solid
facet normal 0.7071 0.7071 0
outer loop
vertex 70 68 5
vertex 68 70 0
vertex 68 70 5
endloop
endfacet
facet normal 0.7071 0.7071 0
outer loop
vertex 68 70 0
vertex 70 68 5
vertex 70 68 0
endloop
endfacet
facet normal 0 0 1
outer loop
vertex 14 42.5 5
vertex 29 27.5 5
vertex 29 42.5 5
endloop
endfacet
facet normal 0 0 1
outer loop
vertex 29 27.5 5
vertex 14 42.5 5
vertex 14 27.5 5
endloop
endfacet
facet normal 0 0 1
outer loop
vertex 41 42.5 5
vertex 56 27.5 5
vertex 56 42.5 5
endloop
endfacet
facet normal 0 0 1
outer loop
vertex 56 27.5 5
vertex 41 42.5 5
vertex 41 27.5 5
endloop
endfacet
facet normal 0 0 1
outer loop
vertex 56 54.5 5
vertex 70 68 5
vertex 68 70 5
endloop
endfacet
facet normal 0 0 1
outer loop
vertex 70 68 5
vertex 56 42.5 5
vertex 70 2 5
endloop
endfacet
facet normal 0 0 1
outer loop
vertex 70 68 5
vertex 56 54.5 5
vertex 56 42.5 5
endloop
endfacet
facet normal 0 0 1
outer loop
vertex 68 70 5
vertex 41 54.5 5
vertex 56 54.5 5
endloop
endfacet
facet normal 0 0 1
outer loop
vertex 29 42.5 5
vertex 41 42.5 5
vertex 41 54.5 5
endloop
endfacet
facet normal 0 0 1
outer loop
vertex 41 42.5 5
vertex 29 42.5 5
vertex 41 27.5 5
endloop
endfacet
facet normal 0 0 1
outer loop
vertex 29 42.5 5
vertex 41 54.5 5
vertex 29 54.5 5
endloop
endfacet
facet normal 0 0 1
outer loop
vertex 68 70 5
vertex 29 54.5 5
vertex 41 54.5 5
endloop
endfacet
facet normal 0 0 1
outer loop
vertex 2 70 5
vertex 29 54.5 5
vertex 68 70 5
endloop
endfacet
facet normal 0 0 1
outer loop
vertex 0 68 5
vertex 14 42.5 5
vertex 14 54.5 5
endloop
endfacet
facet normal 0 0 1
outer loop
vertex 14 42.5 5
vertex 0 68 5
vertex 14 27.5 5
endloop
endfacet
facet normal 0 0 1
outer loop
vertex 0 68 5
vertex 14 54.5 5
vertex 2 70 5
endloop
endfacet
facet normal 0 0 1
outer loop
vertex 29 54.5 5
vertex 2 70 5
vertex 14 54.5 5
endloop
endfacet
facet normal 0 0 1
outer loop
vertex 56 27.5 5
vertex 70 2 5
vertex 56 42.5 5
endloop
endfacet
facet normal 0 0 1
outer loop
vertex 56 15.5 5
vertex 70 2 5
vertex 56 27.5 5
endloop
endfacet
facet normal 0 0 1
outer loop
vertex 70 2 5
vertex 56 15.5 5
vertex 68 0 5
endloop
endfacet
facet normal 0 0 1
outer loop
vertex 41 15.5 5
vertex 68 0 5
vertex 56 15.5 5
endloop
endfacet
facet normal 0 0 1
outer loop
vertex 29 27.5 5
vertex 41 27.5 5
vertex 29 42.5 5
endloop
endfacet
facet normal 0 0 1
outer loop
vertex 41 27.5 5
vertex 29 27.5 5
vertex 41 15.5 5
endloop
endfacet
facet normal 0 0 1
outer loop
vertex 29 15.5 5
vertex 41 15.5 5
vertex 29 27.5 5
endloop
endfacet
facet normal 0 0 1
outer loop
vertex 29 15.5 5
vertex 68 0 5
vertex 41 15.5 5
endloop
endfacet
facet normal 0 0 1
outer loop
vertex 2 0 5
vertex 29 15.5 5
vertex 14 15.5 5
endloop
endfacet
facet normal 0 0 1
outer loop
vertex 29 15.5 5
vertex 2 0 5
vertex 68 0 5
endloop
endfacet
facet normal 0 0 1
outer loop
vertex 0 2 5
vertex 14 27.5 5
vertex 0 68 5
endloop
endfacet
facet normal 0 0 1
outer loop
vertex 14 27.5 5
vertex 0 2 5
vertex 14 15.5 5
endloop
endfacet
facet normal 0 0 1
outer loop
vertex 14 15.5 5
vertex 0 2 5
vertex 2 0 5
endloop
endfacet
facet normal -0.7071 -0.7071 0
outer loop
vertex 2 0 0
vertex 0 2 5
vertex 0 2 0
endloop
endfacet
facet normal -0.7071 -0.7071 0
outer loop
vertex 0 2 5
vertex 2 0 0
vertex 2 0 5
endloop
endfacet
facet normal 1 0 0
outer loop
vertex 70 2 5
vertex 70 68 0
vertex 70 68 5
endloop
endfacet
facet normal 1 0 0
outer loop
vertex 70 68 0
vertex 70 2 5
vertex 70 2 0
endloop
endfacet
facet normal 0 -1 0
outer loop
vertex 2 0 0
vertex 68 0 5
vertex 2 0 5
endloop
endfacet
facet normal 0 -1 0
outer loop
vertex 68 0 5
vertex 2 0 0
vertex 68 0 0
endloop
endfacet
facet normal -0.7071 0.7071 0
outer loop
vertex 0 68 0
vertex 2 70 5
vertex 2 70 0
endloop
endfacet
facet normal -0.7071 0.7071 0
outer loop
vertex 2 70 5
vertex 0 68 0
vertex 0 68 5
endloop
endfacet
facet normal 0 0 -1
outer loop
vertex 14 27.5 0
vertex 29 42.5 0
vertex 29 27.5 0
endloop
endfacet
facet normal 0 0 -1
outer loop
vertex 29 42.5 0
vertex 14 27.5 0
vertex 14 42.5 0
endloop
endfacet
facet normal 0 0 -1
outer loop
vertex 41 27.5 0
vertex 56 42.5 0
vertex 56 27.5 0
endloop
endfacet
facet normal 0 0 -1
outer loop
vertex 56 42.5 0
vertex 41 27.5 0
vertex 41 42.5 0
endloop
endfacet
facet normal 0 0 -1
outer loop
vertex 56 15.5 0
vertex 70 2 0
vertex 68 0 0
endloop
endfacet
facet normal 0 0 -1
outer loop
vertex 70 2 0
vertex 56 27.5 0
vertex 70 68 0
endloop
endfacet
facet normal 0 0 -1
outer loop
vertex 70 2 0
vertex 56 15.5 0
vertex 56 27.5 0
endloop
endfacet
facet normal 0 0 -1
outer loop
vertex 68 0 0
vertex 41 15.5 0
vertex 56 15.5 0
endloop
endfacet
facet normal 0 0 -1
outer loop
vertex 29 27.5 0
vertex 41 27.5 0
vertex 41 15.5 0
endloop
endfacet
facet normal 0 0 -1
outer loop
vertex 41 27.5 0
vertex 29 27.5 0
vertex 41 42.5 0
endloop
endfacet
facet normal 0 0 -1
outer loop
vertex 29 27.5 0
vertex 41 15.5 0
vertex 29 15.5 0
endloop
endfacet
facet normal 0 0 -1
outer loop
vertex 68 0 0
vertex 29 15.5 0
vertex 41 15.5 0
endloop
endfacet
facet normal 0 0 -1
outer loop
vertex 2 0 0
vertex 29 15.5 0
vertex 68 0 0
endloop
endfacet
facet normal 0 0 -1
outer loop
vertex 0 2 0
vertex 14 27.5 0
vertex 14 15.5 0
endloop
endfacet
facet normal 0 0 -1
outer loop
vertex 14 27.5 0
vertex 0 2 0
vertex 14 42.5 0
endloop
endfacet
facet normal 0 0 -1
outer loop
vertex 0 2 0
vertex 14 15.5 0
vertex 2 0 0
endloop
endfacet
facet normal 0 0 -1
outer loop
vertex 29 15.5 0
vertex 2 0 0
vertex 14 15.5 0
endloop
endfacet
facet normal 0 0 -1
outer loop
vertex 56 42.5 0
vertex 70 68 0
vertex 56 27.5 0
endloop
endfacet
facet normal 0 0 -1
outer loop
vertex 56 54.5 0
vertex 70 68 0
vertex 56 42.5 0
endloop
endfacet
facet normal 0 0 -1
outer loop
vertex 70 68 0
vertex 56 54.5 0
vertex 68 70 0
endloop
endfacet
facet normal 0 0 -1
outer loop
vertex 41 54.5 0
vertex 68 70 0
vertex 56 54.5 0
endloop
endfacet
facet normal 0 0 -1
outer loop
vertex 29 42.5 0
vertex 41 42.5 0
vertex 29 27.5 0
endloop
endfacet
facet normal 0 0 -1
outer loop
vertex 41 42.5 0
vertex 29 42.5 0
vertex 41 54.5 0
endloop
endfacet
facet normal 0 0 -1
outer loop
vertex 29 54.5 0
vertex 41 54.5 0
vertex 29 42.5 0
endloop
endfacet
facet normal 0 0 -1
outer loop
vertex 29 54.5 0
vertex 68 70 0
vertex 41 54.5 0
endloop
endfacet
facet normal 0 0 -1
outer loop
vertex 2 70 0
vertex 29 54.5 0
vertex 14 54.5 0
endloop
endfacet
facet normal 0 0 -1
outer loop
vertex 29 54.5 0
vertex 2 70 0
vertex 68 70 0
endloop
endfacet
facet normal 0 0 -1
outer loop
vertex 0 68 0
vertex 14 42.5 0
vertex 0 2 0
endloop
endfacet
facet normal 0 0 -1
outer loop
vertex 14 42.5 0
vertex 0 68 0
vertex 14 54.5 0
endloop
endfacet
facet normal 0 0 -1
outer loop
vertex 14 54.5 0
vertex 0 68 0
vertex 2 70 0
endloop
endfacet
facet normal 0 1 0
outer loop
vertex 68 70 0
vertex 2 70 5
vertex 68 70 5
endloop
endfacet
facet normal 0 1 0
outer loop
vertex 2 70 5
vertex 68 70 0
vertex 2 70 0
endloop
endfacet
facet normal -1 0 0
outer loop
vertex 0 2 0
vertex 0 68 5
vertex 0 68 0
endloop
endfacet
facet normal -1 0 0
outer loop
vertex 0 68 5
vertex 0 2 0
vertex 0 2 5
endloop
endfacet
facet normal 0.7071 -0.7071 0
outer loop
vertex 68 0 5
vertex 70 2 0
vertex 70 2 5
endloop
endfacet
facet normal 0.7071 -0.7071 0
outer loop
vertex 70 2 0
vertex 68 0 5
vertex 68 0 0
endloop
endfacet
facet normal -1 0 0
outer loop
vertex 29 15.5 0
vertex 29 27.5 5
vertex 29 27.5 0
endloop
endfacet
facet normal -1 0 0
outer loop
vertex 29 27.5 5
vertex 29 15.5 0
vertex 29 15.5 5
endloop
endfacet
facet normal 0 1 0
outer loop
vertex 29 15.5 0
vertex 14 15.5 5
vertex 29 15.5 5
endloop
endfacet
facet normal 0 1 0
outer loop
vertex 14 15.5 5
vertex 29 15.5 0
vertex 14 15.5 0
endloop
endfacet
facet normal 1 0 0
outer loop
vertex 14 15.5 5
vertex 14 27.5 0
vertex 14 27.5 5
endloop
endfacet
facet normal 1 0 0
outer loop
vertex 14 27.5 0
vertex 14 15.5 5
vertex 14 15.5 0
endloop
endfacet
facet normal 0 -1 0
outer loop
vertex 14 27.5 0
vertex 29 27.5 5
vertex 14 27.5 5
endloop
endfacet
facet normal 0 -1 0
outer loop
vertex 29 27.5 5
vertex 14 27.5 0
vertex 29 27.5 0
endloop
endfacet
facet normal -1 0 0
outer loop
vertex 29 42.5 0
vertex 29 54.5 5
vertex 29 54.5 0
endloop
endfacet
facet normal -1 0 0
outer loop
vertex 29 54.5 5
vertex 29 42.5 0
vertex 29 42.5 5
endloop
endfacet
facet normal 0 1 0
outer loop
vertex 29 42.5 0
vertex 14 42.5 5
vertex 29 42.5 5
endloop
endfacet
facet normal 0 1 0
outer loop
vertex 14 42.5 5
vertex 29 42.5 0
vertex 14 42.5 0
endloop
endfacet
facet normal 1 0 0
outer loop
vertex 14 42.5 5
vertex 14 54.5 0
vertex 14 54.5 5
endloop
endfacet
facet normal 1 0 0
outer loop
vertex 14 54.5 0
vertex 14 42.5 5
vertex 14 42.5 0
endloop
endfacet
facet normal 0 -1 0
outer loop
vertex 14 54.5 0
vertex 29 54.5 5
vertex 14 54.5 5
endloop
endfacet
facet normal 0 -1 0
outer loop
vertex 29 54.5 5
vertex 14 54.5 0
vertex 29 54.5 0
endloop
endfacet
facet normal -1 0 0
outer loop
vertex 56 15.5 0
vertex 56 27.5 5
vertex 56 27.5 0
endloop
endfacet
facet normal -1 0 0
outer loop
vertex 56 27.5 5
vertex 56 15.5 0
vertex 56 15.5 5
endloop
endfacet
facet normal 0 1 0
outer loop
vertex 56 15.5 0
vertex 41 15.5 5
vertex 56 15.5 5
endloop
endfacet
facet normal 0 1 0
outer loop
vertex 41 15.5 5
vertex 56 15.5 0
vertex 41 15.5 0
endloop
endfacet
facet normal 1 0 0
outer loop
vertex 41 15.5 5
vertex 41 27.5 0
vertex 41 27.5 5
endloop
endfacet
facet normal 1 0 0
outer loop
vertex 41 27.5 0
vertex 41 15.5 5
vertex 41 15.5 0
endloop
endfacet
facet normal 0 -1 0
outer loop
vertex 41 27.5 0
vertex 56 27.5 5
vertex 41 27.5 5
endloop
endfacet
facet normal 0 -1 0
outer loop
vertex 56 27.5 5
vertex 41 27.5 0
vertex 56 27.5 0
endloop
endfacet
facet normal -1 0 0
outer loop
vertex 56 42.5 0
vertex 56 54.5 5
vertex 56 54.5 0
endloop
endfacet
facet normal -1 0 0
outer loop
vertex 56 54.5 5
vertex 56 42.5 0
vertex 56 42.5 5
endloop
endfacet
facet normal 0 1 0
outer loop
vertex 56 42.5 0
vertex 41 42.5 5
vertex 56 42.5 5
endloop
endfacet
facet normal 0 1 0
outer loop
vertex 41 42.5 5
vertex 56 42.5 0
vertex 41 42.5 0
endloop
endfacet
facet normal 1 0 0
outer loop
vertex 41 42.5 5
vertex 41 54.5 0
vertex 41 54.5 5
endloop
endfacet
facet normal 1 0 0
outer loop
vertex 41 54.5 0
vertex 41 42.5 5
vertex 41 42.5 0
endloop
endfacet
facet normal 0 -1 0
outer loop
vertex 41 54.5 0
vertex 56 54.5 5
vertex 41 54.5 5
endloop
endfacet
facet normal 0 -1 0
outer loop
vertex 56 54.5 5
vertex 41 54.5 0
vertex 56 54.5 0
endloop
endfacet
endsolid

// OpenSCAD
$fn = 32;

// ----------------------------------------------------------------------
// Windowed plate: 4 voids, 70 x 70 x 5 mm
// ----------------------------------------------------------------------

// --- parameters (mm) ---
plate_l = 70;             // plate length, X
plate_w = 70;             // plate width, Y
plate_t = 5;              // plate thickness, Z
edge_margin = 8;          // wall from the plate edge to any window
win_l = 15;               // pocket length
win_w = 12;               // pocket width
pitch_x = 27;             // grid pitch along X
pitch_y = 27;             // grid pitch along Y
depth_1 = 5;              // depth of void 1 (full thickness = through)
depth_2 = 5;              // depth of void 2 (full thickness = through)
depth_3 = 5;              // depth of void 3 (full thickness = through)
depth_4 = 5;              // depth of void 4 (full thickness = through)
corner_c = 2;             // corner chamfer of the plate
fit_tol = 0.02;           // declared fit tolerance (prompt contract)
free_tol = 0.2;           // declared free tolerance (prompt contract)

profile = [[2, 0], [68, 0], [70, 2], [70, 68], [68, 70], [2, 70], [0, 68], [0, 2]];  // primary outline, 8 points, counter clockwise
void_1 = [[14, 15.5], [29, 15.5], [29, 27.5], [14, 27.5]];  // pocket at grid node 0,0, 4 points
void_2 = [[14, 42.5], [29, 42.5], [29, 54.5], [14, 54.5]];  // pocket at grid node 0,1, 4 points
void_3 = [[41, 15.5], [56, 15.5], [56, 27.5], [41, 27.5]];  // pocket at grid node 1,0, 4 points
void_4 = [[41, 42.5], [56, 42.5], [56, 54.5], [41, 54.5]];  // pocket at grid node 1,1, 4 points

// --- the one profile operation ---
difference() {
  linear_extrude(height = plate_t) polygon(points = profile);
  translate([0, 0, -1])
    linear_extrude(height = plate_t + 2) polygon(points = void_1);
  translate([0, 0, -1])
    linear_extrude(height = plate_t + 2) polygon(points = void_2);
  translate([0, 0, -1])
    linear_extrude(height = plate_t + 2) polygon(points = void_3);
  translate([0, 0, -1])
    linear_extrude(height = plate_t + 2) polygon(points = void_4);
}
